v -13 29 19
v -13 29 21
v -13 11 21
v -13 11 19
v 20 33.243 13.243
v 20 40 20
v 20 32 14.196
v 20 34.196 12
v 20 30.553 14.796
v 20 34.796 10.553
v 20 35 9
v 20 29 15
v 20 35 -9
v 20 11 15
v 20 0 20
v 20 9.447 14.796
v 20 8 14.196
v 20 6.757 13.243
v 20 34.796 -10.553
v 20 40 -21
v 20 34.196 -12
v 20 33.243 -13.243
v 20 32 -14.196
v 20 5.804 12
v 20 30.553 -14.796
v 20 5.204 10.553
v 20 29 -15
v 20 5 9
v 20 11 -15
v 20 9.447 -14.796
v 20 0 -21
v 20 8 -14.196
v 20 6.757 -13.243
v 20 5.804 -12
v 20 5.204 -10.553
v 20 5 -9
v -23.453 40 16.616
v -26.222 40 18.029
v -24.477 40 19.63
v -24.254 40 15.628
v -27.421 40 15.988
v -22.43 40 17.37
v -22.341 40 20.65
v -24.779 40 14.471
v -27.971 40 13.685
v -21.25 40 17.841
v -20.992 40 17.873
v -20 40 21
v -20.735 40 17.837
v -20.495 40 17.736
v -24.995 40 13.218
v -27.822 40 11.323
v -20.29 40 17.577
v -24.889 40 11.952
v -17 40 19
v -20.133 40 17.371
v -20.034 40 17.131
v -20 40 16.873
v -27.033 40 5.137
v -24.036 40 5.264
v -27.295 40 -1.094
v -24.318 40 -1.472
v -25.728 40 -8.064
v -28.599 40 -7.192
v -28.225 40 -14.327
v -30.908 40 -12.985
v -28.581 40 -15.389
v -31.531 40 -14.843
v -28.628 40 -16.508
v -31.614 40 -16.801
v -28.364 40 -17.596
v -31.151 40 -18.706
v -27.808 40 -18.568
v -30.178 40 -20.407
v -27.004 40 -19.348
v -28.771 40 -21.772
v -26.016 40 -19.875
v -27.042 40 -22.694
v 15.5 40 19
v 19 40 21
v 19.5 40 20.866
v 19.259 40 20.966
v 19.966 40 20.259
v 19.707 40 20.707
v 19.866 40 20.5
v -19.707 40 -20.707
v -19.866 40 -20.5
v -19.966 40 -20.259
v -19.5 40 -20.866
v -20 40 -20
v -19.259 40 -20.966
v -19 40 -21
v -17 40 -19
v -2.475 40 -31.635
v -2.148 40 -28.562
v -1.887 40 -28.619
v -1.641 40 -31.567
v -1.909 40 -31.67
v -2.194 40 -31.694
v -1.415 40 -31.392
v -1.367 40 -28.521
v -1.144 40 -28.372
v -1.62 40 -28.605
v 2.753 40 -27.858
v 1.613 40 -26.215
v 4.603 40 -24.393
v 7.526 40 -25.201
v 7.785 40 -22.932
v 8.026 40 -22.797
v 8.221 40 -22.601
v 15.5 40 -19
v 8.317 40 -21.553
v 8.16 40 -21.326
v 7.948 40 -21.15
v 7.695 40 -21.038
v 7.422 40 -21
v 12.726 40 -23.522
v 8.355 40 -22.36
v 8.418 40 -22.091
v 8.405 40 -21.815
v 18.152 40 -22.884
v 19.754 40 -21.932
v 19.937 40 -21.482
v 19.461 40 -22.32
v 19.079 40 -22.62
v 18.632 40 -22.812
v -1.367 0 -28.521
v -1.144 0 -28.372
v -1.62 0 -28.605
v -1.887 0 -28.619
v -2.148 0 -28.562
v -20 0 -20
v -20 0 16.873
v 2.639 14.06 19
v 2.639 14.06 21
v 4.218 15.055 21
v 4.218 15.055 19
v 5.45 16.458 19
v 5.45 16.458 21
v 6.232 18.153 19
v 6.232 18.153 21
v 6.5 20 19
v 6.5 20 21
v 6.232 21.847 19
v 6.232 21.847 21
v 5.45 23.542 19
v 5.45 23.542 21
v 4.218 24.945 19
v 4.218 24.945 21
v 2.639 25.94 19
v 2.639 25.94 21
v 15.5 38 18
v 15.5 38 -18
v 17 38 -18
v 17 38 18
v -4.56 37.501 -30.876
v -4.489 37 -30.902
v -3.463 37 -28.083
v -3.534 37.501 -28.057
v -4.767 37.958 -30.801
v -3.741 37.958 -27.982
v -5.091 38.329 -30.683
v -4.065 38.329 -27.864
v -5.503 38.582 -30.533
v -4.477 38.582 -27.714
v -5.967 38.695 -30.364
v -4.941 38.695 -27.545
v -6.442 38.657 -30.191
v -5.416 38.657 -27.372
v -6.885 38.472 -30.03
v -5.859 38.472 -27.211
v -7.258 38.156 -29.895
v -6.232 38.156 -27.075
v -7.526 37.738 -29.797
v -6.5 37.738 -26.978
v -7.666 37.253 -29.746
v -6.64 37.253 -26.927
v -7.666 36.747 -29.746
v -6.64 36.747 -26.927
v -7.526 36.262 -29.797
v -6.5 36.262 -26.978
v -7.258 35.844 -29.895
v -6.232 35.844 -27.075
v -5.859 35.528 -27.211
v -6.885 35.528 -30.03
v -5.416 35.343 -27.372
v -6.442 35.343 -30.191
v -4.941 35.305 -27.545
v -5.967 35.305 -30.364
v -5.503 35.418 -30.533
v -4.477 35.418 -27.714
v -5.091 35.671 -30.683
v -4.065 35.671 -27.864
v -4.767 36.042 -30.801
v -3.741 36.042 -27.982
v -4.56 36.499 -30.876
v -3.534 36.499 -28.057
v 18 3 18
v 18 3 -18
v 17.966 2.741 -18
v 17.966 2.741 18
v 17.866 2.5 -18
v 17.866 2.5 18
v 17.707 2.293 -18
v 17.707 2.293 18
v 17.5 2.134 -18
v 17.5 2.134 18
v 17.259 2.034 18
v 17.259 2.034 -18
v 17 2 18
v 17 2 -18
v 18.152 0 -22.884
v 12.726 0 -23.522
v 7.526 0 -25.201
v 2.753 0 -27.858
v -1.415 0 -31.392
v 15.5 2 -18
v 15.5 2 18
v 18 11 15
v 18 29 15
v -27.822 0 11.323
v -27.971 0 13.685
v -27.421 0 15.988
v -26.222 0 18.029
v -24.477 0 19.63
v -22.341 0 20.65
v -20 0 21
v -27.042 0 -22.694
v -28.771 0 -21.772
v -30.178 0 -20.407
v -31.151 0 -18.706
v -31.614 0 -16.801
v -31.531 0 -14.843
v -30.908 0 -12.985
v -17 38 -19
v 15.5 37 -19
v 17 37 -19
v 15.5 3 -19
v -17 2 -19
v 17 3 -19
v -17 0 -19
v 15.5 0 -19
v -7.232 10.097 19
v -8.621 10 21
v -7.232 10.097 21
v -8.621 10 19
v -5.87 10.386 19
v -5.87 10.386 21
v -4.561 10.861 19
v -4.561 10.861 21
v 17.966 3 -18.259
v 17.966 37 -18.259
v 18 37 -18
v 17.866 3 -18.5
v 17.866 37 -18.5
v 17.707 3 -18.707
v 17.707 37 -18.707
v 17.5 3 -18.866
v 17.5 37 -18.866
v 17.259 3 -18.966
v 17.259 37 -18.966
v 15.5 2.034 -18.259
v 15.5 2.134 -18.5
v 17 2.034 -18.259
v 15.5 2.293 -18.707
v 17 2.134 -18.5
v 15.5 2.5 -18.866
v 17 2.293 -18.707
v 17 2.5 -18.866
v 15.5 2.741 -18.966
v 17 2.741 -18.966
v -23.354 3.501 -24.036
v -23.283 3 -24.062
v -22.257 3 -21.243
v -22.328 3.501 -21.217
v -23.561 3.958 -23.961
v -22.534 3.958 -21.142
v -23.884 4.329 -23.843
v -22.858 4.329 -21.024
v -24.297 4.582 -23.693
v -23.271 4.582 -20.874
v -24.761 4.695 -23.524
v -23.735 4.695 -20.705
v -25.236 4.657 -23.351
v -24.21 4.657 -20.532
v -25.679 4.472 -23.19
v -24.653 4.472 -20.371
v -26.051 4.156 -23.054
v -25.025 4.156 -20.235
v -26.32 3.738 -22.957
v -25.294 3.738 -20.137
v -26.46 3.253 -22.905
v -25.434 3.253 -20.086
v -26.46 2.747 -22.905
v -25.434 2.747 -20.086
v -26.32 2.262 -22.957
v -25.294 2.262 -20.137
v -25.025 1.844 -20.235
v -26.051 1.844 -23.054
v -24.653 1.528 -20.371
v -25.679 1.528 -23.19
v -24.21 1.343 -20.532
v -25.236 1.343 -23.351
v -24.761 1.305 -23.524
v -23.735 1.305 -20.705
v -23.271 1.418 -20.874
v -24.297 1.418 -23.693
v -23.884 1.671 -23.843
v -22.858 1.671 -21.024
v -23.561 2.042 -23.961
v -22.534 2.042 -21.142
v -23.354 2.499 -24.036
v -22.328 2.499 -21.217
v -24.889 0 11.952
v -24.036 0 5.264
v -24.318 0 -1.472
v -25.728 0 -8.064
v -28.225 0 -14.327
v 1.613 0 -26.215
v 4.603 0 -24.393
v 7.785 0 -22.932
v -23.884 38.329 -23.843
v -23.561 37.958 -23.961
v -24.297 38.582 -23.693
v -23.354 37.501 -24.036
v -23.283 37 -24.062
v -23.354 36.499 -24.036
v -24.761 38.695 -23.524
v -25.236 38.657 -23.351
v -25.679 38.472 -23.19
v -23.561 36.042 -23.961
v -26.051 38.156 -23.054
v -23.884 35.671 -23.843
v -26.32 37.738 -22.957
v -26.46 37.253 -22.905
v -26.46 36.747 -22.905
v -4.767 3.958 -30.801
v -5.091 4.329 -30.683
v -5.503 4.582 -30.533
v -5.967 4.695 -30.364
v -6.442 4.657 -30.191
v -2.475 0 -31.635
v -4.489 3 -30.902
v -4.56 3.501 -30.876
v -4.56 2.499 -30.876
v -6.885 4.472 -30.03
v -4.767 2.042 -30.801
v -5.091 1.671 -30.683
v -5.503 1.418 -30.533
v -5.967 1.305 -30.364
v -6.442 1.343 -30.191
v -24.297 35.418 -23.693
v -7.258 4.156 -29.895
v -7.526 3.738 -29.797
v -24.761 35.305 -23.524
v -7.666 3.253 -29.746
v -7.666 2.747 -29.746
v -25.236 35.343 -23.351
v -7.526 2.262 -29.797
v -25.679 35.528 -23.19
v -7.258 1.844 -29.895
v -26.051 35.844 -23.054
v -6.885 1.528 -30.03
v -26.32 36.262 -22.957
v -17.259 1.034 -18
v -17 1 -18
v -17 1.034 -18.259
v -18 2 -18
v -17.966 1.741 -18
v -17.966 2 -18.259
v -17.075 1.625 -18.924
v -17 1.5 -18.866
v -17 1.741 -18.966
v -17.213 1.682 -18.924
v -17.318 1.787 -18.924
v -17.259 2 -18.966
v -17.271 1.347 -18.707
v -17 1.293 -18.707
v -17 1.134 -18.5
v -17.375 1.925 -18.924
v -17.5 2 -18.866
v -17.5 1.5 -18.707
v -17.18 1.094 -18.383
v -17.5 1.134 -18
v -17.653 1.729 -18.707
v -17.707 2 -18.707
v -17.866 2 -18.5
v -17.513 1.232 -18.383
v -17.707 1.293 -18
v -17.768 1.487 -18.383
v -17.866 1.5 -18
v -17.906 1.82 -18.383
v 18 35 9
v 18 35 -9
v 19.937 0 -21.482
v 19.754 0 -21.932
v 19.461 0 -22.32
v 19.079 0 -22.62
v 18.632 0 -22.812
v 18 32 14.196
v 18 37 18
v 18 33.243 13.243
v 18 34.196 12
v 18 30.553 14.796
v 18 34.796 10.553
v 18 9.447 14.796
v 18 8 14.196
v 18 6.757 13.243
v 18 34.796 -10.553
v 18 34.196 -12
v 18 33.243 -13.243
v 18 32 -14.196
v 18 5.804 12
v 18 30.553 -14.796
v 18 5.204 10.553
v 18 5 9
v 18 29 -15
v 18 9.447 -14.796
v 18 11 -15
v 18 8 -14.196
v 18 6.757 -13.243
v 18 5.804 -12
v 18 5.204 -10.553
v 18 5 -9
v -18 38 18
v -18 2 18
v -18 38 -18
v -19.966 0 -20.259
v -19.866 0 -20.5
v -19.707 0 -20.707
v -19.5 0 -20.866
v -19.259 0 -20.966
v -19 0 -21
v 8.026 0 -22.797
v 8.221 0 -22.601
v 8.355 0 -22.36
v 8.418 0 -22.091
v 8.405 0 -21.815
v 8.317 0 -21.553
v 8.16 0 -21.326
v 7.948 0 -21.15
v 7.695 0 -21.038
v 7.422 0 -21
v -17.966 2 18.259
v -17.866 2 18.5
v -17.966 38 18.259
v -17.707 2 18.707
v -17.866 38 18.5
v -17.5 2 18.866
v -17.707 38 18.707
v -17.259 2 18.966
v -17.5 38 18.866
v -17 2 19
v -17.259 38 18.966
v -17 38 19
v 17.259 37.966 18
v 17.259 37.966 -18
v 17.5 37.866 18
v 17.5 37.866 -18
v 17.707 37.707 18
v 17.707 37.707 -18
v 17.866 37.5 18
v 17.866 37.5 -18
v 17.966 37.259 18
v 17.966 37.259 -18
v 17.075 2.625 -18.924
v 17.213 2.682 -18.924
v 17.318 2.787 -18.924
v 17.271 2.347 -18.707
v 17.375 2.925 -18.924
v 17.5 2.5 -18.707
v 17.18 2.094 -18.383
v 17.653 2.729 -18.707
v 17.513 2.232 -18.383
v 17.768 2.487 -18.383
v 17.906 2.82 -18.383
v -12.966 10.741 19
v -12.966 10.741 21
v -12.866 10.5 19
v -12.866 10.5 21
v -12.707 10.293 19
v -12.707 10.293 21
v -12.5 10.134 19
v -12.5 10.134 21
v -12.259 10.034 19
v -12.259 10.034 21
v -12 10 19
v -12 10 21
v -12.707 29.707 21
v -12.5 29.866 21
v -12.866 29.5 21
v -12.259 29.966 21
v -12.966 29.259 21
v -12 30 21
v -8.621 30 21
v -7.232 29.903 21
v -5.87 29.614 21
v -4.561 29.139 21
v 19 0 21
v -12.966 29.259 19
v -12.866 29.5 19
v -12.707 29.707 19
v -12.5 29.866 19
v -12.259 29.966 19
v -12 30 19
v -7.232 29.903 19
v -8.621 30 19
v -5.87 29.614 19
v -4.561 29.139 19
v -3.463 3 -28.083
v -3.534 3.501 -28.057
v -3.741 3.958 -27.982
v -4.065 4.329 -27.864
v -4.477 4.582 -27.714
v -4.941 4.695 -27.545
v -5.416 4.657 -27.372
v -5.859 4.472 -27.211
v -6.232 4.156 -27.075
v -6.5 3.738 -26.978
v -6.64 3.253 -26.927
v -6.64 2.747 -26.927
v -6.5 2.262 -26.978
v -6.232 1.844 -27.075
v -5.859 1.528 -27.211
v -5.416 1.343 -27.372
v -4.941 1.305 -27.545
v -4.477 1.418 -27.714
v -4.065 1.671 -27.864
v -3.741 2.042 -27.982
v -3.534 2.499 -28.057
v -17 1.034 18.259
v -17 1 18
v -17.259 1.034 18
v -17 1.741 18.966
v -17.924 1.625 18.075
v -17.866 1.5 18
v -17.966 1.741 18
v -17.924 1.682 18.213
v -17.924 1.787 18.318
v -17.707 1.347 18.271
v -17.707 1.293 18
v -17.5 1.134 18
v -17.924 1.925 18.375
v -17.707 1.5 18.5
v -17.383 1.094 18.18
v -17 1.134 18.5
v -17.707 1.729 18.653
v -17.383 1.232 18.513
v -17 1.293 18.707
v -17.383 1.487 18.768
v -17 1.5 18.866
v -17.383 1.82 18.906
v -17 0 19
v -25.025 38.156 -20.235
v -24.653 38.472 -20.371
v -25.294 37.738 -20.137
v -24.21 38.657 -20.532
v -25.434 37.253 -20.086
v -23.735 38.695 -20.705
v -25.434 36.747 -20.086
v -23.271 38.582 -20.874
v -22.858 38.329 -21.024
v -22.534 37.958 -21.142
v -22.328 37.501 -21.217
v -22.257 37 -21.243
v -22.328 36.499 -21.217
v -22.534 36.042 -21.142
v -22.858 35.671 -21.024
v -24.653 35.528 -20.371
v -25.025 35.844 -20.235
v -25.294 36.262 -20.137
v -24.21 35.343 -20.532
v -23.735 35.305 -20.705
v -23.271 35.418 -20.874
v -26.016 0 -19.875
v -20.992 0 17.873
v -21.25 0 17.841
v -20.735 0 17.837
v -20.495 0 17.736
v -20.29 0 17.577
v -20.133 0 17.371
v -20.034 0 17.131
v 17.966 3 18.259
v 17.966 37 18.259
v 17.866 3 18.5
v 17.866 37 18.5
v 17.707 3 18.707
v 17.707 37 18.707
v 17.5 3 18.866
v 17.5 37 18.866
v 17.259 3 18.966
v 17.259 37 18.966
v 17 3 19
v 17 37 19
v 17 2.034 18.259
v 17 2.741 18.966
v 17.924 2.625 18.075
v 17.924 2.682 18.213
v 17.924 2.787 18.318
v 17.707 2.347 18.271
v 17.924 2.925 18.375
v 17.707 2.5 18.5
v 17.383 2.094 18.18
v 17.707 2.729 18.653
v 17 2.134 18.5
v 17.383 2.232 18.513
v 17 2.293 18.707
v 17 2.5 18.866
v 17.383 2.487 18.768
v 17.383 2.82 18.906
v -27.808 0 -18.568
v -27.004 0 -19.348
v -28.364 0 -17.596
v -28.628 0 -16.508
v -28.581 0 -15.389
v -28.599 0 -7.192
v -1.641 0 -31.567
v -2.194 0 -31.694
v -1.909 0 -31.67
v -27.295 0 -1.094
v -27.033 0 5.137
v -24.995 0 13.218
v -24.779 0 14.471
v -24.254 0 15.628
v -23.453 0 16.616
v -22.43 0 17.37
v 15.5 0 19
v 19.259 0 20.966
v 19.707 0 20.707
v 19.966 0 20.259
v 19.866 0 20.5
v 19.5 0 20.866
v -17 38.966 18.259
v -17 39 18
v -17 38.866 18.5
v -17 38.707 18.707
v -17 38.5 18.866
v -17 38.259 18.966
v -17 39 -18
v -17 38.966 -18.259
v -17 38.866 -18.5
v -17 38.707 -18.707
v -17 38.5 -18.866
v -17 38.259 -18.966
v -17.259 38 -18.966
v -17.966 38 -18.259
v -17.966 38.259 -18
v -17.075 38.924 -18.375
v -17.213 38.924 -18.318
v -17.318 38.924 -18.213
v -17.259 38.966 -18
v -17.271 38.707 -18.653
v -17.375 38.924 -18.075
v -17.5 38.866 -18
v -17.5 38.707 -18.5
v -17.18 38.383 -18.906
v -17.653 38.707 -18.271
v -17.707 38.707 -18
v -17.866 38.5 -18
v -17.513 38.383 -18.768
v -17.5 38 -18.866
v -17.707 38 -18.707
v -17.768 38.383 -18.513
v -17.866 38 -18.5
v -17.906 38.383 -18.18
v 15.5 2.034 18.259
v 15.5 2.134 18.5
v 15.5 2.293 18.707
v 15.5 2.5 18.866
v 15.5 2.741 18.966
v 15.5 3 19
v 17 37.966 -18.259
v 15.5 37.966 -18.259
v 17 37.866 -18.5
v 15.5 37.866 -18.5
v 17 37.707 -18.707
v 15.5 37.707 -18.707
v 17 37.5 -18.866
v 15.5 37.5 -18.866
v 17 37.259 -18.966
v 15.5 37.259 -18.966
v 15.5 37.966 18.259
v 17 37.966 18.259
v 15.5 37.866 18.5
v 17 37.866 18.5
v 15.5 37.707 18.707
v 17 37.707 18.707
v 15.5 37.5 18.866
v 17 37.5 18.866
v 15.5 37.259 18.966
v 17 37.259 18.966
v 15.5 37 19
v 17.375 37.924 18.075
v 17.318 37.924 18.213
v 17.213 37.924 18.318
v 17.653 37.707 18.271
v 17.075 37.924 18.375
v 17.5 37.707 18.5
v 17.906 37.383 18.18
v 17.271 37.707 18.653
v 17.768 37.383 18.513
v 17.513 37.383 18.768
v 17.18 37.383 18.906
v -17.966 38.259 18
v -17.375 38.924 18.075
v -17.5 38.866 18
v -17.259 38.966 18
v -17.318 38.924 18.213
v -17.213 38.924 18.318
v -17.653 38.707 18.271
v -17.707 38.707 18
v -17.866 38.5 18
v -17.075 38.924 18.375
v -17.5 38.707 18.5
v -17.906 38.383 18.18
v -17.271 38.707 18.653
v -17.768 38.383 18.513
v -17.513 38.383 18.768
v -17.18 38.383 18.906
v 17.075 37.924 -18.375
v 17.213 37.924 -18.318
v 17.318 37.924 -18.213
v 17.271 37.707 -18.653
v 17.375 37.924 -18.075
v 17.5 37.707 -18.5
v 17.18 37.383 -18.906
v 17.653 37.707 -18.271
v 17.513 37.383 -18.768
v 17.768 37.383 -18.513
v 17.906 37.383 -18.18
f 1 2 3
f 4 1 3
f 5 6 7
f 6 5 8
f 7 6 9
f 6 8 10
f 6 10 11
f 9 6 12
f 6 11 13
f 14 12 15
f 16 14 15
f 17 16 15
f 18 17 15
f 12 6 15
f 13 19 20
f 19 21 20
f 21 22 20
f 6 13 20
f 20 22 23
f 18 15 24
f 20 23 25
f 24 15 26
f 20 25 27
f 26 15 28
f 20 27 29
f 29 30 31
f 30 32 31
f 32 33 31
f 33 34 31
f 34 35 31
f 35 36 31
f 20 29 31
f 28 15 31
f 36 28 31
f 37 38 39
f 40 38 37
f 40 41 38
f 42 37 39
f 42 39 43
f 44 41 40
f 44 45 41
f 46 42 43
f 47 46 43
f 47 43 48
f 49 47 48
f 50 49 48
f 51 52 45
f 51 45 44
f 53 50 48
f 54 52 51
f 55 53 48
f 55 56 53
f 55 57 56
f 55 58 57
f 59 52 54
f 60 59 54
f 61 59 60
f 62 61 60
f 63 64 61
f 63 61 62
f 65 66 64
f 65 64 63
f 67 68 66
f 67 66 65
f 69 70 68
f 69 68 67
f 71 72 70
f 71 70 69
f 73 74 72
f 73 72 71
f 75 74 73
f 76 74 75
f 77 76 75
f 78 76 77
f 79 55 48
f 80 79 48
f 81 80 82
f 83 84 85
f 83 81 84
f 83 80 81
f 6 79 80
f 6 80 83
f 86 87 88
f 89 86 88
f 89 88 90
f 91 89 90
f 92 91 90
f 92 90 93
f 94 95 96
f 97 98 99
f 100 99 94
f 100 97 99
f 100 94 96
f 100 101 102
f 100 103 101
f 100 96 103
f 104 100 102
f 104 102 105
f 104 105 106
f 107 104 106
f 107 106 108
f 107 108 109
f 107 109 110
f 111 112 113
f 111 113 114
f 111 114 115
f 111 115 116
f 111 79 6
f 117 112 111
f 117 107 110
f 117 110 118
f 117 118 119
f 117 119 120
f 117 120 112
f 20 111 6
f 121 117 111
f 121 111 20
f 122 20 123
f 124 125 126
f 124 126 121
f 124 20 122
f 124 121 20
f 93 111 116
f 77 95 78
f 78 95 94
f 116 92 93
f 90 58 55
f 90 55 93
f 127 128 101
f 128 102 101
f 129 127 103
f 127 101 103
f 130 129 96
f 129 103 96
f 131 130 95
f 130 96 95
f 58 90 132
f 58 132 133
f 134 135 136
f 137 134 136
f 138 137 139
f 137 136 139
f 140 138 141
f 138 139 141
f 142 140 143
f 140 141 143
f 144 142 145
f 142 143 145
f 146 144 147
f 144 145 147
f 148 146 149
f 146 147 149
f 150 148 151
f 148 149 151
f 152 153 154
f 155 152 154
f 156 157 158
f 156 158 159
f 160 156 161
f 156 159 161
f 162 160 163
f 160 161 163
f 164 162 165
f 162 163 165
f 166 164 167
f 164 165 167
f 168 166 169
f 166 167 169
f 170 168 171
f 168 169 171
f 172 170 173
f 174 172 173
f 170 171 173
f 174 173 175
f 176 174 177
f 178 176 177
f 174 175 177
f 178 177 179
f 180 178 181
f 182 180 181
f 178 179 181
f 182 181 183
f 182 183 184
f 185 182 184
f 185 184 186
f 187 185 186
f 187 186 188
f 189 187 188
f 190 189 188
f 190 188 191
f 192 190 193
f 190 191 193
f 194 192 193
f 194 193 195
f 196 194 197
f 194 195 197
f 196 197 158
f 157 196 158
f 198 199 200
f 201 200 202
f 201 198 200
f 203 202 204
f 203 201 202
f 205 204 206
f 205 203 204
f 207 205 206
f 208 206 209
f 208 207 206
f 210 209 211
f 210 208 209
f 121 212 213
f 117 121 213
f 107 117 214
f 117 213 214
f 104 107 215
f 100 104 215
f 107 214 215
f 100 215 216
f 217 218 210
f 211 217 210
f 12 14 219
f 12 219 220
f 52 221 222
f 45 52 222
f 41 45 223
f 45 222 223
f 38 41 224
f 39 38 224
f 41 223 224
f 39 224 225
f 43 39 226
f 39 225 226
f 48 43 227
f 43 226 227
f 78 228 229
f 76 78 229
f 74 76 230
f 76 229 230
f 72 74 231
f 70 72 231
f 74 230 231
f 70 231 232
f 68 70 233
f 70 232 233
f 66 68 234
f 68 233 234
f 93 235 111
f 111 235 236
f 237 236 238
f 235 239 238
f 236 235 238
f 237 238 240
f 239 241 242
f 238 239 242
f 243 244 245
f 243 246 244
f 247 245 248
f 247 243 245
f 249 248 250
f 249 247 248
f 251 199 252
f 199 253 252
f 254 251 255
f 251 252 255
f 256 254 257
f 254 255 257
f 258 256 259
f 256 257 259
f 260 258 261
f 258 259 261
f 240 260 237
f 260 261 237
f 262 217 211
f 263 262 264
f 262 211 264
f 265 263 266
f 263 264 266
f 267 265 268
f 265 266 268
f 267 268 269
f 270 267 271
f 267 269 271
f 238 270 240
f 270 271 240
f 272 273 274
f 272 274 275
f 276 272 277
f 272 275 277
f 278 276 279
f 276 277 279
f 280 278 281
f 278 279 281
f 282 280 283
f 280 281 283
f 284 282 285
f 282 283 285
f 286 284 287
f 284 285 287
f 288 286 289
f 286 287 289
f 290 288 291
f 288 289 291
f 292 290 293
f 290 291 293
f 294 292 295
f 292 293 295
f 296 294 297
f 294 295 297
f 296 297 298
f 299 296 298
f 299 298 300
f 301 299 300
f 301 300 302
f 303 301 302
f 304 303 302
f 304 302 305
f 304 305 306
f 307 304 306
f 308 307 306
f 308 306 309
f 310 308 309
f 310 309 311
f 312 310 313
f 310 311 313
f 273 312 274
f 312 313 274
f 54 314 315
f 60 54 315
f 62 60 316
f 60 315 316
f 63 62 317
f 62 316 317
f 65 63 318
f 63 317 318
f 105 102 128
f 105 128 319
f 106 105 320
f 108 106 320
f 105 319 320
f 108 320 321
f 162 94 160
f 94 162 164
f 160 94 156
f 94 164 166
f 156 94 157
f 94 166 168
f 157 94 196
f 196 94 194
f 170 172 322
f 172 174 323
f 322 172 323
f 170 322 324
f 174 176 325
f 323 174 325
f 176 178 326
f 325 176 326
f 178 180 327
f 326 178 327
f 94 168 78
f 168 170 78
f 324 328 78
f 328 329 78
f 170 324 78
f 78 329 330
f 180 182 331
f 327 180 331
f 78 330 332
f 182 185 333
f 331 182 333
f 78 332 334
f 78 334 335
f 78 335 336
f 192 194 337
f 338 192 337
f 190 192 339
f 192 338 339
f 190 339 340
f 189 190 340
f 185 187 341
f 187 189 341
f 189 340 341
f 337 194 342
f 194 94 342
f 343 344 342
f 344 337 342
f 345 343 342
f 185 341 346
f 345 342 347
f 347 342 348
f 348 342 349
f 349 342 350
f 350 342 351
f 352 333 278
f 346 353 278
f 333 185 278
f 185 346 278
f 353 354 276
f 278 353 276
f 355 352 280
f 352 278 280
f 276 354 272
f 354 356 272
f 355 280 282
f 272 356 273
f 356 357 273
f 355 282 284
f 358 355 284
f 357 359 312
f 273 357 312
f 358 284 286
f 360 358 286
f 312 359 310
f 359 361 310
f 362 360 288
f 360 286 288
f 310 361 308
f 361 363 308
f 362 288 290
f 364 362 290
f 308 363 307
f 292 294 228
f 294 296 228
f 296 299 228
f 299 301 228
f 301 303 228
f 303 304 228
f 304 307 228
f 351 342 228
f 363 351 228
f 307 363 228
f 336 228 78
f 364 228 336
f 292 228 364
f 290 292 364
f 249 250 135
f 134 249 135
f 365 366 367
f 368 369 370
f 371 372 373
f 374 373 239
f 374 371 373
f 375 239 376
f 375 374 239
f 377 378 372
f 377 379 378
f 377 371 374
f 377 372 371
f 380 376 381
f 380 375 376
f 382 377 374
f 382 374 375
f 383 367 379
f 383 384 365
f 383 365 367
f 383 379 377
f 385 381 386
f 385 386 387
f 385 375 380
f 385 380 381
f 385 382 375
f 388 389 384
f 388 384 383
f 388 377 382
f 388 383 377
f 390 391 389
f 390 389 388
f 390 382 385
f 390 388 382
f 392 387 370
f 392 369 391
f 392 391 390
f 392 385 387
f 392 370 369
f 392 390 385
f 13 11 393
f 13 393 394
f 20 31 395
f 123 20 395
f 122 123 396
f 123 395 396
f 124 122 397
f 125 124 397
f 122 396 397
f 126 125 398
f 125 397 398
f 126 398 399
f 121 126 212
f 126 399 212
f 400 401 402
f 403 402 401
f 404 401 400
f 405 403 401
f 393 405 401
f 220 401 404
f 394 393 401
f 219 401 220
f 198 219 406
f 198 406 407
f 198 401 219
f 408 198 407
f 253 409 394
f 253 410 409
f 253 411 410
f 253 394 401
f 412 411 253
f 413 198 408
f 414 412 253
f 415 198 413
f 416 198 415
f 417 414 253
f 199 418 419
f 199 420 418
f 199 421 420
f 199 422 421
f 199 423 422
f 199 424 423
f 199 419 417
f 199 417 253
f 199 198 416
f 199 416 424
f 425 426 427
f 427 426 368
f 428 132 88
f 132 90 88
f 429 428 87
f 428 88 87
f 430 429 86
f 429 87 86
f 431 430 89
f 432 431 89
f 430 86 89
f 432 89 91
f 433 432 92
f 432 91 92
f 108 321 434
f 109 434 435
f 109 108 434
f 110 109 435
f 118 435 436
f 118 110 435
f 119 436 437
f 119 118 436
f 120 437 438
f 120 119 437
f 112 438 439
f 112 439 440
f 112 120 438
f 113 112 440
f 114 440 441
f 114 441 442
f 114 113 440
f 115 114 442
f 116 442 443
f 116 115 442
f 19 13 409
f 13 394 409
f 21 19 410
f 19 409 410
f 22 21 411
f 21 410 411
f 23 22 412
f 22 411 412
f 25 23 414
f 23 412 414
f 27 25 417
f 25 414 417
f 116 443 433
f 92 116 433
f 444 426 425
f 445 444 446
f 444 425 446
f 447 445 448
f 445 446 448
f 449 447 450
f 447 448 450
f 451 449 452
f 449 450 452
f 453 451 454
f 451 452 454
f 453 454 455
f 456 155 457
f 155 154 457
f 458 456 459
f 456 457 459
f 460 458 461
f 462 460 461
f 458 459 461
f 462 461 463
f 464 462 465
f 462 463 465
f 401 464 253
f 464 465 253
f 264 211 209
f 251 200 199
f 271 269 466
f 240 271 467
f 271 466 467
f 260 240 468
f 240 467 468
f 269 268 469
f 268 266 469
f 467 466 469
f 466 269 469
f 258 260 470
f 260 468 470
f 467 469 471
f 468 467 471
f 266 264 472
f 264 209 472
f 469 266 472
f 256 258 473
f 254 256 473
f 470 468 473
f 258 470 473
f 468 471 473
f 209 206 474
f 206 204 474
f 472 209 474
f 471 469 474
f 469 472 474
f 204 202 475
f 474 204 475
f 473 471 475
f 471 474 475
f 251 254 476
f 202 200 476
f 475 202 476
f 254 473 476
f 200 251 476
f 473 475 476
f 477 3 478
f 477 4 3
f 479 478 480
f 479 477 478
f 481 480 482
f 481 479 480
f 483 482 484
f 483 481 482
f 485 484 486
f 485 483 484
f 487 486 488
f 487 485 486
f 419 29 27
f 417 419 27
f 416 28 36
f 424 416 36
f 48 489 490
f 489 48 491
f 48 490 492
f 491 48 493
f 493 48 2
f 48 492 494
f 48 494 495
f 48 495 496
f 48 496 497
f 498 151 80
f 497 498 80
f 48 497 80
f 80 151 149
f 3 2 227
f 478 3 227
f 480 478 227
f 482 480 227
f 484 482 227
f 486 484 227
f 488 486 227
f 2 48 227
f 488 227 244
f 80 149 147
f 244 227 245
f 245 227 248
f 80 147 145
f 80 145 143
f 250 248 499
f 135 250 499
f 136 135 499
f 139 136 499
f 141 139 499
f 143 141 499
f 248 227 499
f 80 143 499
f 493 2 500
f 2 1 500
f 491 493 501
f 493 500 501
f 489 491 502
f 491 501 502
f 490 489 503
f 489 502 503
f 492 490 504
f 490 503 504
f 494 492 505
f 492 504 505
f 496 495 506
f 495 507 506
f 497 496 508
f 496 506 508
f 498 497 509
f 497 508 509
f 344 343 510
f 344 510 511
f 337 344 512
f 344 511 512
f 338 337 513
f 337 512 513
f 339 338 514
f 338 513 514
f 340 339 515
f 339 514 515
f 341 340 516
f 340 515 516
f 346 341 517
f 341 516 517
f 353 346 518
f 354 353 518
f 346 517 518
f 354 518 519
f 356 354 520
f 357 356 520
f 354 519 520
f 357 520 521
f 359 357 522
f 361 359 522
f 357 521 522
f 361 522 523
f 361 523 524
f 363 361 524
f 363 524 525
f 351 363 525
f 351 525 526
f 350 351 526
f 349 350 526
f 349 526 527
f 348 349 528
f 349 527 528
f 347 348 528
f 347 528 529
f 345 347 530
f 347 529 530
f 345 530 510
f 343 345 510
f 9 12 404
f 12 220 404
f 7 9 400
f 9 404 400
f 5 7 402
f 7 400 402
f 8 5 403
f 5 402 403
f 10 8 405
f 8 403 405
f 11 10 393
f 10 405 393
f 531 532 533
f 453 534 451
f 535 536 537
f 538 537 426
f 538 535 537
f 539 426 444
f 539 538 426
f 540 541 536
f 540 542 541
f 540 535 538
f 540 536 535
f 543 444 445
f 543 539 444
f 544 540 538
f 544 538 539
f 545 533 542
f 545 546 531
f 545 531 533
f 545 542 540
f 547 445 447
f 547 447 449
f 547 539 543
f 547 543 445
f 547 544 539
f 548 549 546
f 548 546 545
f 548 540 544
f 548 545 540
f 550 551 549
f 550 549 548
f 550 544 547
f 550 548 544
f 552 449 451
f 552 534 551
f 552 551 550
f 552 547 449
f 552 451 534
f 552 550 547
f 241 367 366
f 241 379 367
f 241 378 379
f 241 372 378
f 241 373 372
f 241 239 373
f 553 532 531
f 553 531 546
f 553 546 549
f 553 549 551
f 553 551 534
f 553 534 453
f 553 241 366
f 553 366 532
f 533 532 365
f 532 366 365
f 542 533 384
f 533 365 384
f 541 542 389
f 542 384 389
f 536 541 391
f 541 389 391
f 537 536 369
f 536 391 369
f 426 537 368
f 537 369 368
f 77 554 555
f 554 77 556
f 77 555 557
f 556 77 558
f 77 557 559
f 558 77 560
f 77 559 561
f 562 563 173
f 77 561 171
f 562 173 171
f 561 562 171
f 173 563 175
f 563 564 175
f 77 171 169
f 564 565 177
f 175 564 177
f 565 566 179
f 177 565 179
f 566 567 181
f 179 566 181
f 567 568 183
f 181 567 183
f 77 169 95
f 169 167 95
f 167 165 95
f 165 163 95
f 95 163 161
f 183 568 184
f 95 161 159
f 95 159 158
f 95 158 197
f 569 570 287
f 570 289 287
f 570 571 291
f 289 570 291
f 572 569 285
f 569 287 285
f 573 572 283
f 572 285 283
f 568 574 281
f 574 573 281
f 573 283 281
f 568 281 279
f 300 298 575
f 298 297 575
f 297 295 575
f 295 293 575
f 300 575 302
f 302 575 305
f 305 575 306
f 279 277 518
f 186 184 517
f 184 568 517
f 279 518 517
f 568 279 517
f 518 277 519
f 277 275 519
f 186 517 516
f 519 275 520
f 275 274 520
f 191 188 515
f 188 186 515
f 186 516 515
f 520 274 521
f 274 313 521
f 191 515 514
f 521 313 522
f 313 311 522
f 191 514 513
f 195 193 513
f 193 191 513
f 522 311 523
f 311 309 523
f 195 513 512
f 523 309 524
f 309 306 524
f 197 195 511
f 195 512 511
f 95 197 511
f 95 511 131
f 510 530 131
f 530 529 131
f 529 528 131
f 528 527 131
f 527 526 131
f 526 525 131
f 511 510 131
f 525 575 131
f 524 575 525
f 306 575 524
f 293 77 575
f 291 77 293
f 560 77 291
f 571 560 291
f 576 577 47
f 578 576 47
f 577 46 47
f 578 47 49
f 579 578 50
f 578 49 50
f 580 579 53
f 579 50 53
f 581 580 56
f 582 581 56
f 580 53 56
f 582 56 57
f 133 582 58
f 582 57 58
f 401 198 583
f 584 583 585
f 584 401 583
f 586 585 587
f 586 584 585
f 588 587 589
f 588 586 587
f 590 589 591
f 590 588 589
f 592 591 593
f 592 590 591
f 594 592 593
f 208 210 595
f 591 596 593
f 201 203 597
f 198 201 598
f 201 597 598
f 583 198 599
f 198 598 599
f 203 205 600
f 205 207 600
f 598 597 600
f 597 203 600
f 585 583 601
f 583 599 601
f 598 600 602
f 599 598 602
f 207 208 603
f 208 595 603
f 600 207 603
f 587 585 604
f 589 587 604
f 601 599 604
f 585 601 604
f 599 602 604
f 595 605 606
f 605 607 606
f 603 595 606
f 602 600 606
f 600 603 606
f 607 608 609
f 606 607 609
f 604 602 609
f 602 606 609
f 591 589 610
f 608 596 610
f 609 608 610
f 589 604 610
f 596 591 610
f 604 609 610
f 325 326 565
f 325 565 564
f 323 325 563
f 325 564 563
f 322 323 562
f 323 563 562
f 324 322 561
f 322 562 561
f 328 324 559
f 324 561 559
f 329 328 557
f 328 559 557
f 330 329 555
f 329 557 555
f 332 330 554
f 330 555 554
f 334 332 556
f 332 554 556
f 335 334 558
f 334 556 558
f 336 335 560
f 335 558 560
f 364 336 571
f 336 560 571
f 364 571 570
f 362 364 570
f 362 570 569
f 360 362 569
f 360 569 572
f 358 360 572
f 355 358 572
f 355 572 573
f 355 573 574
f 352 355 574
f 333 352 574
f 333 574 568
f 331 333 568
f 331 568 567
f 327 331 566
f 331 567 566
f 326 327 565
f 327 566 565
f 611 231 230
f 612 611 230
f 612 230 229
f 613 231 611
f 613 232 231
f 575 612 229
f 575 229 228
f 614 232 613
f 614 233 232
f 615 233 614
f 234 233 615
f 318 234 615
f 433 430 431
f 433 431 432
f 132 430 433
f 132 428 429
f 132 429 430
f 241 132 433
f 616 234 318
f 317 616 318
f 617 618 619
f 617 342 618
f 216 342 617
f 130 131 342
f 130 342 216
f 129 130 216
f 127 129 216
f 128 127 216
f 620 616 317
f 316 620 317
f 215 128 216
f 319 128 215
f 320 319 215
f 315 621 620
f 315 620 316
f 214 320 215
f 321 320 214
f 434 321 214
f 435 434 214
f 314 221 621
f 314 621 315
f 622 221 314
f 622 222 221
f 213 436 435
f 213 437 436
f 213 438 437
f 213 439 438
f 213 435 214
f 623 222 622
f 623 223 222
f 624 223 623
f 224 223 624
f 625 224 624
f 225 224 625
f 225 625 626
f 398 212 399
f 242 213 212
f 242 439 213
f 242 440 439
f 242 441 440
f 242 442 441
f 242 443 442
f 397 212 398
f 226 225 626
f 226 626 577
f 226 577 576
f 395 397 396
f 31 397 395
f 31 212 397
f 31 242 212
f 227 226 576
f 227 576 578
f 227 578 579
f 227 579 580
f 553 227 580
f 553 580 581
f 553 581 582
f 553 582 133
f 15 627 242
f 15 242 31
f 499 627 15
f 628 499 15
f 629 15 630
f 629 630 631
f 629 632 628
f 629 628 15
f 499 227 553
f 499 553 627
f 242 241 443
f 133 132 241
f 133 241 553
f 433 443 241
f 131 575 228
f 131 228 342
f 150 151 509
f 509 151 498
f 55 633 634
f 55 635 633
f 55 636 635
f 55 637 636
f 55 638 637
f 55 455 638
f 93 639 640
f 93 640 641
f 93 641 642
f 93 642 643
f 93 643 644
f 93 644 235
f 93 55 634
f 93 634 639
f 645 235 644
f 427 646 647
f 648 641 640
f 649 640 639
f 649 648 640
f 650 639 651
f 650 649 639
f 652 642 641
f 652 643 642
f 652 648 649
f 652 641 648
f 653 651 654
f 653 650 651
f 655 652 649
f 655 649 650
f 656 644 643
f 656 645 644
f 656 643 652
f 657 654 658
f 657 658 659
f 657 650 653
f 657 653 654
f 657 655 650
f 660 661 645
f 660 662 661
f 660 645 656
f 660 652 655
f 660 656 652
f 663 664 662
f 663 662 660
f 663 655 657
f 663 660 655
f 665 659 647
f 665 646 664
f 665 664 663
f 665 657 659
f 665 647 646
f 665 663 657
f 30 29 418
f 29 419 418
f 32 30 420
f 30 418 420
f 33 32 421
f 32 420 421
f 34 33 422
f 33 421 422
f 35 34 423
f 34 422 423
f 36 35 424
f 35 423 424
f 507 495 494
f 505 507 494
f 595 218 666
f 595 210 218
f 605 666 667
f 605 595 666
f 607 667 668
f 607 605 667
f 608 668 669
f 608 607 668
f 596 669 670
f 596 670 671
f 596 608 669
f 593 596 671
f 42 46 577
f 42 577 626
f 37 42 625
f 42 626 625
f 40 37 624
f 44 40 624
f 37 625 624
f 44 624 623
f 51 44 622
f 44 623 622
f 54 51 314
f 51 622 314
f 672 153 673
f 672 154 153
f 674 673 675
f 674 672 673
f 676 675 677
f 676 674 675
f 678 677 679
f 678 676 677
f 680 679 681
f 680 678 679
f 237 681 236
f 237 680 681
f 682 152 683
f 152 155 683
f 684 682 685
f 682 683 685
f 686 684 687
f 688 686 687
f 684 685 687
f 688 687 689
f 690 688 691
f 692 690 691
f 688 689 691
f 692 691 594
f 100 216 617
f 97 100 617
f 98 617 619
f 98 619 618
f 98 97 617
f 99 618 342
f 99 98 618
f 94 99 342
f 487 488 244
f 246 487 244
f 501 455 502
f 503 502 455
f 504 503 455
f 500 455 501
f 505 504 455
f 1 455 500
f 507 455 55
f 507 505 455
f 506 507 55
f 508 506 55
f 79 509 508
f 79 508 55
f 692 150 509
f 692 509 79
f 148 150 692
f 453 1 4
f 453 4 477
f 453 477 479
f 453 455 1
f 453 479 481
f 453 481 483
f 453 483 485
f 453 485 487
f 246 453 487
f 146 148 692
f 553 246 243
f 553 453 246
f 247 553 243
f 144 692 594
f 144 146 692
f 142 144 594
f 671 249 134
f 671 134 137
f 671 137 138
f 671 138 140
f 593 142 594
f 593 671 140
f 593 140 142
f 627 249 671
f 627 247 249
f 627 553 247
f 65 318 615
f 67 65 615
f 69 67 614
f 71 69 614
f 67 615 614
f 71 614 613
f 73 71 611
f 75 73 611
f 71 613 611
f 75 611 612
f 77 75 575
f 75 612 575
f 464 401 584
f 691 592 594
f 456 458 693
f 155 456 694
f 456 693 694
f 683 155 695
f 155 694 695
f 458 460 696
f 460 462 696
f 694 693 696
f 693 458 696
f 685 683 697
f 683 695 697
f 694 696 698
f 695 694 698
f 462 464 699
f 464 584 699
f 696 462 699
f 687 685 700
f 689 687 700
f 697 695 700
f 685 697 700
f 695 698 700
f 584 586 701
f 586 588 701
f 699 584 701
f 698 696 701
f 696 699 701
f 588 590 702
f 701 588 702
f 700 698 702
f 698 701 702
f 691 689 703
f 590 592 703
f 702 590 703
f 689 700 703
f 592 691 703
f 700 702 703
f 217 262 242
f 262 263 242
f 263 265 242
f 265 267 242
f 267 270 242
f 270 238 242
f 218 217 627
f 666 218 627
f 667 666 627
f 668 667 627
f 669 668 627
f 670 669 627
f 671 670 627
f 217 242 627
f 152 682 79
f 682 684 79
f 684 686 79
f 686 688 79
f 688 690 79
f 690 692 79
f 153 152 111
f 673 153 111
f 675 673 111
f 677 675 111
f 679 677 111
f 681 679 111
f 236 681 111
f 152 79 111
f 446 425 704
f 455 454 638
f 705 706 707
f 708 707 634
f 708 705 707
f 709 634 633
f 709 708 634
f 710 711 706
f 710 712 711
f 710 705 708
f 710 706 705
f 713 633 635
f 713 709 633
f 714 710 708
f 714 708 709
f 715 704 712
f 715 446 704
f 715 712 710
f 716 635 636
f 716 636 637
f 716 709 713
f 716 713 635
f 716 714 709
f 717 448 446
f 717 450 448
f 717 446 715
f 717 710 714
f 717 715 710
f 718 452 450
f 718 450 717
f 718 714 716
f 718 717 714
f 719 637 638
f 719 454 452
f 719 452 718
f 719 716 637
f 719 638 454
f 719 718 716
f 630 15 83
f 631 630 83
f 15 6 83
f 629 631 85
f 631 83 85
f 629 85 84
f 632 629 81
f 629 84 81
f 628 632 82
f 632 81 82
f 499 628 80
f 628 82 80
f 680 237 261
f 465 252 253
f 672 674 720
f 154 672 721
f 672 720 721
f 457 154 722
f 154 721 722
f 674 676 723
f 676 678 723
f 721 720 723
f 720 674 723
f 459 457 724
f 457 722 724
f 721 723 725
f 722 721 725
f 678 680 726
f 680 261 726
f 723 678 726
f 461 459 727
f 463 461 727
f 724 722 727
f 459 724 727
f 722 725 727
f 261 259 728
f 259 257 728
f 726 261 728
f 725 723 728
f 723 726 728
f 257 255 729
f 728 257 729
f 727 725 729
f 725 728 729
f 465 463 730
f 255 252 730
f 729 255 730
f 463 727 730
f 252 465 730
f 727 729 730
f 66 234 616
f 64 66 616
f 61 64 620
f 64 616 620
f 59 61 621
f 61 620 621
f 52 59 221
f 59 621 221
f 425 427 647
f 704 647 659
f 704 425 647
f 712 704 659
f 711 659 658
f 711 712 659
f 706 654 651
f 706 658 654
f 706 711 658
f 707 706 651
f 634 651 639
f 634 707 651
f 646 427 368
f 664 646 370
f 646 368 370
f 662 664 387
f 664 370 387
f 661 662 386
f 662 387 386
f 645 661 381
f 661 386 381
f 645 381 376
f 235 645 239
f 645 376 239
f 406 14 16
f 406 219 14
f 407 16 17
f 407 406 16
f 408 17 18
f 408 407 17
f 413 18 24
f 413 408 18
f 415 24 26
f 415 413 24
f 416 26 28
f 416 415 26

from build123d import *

# Parameters (mm, degrees)
SKIZZE1_W                       = 36
SKIZZE1_H                       = 38
AUFSATZ_LINEAR_AUSTRAGEN2_DEPTH = 40
VERRUNDUNG1_R                   = 1
SCHNITT_LINEAR_AUSTRAGEN1_REACH = 74.681
SKIZZE2_W                       = 30
SKIZZE2_H                       = 30
VERRUNDUNG2_R                   = 6
DURCHGANGSLOCH_F_R_M31_D        = 3.4
DURCHGANGSLOCH_F_R_M31_DEPTH    = 3
DURCHGANGSLOCH_F_R_M31_TIP      = 1.021463052
SKIZZE5_W                       = 2.5
SKIZZE5_H                       = 38
SKIZZE5_W_2                     = 1
AUFSATZ_LINEAR_AUSTRAGEN3_DEPTH = 2
SKIZZE8_W                       = 1
SKIZZE8_H                       = 38
SCHNITT_LINEAR_AUSTRAGEN3_DEPTH = 1
SKIZZE6_W                       = 2.5
SKIZZE6_H                       = 38
SKIZZE6_W_2                     = 1
AUFSATZ_LINEAR_AUSTRAGEN4_DEPTH = 2
SKIZZE9_W                       = 1
SKIZZE9_H                       = 38
SCHNITT_LINEAR_AUSTRAGEN4_DEPTH = 1
VERRUNDUNG3_R                   = 1
VERRUNDUNG4_R                   = 1
SCHNITT_LINEAR_AUSTRAGEN2_REACH = 75.338
VERRUNDUNG9_R                   = 1
VERRUNDUNG10_R                  = 10


with BuildPart() as part:
    # Skizze1 → Aufsatz-Linear austragen2 (new body)
    with BuildSketch(Plane(origin=(0, 0, 0), x_dir=(1, 0, 0), z_dir=(0, 1, 0))):
        with BuildLine():
            Line((20, -21), (20, 21))
            ThreePointArc((20, 21), (19.460793496, 22.319706051), (18.151722222, 22.884241359))
            ThreePointArc((18.151722222, 22.884241359), (7.231561818, 25.331524584), (-1.857986079, 31.859864147))
            Line((-1.857986079, 31.859864147), (-27.041617117, 22.693772058))
            ThreePointArc((-27.041617117, 22.693772058), (-31.15076398, 18.70575902), (-30.908104914, 12.984705575))
            ThreePointArc((-30.908104914, 12.984705575), (-27.294602816, 1.09378988), (-27.822222222, -11.322847799))
            ThreePointArc((-27.822222222, -11.322847799), (-26.22162429, -18.029054702), (-20, -21))
            Line((-20, -21), (20, -21))
        make_face()
        Rectangle(SKIZZE1_W, SKIZZE1_H, mode=Mode.SUBTRACT)
        with BuildLine():
            Line((16, 21), (-20, 21))
            Line((-20, 21), (-20, -18))
            ThreePointArc((-20, -18), (-23.888515181, -16.143159189), (-24.888888889, -11.951779874))
            ThreePointArc((-24.888888889, -11.951779874), (-24.318489531, 1.471612211), (-28.224978285, 14.326656205))
            ThreePointArc((-28.224978285, 14.326656205), (-28.363640609, 17.595829603), (-26.015556687, 19.874694196))
            Line((-26.015556687, 19.874694196), (-1.583548546, 28.767217922))
            ThreePointArc((-1.583548546, 28.767217922), (6.56927519, 23.437142814), (16, 21))
        make_face(mode=Mode.SUBTRACT)
    extrude(amount=AUFSATZ_LINEAR_AUSTRAGEN2_DEPTH)

    # Verrundung1
    verrundung1_edges = [part.edges().sort_by_distance(p)[0] for p in [
        (20, 20, 21),
        (16, 20, -21),
        (-1.583548546, 20, -28.767217922),
        (-20, 20, 18),
        (-20, 20, -21),
    ]]
    fillet(verrundung1_edges, radius=VERRUNDUNG1_R)

    # Skizze2 → Schnitt-Linear austragen1 (cut, up to next)
    with BuildSketch(Plane(origin=(20, 0, 0), x_dir=(0, 0, -1), z_dir=(1, 0, 0)), mode=Mode.PRIVATE) as schnitt_linear_austragen1_sk1:
        with Locations((0, 20)):
            Rectangle(SKIZZE2_W, SKIZZE2_H)
    schnitt_linear_austragen1_tool1 = extrude(schnitt_linear_austragen1_sk1.sketch, amount=-SCHNITT_LINEAR_AUSTRAGEN1_REACH, mode=Mode.PRIVATE) & part.part
    add(schnitt_linear_austragen1_tool1.solids().sort_by_distance((20, 20, 0))[0], mode=Mode.SUBTRACT)

    # Verrundung2
    verrundung2_edges = [part.edges().sort_by_distance(p)[0] for p in [
        (19, 5, 15),
        (19, 35, 15),
        (19, 35, -15),
        (19, 5, -15),
    ]]
    fillet(verrundung2_edges, radius=VERRUNDUNG2_R)

    # Durchgangsloch für M31
    with Locations(Plane(origin=(-10.456906044, 0, -28.730113233), x_dir=(-0.9396926207859081, 0, 0.34202014332566955), z_dir=(-0.34202014332566955, 0, -0.9396926207859082))):
        with Locations((-4.650779494, 37), (15.349220506, 3), (-4.650779494, 3), (15.349220506, 37)):
            Hole(DURCHGANGSLOCH_F_R_M31_D / 2, depth=DURCHGANGSLOCH_F_R_M31_DEPTH)
            with Locations((0, 0, -(DURCHGANGSLOCH_F_R_M31_DEPTH + DURCHGANGSLOCH_F_R_M31_TIP / 2))):  # 118° drill point
                Cone(0, DURCHGANGSLOCH_F_R_M31_D / 2, DURCHGANGSLOCH_F_R_M31_TIP, mode=Mode.SUBTRACT)

    # Skizze5 → Aufsatz-Linear austragen3 (add)
    with BuildSketch(Plane.XZ):
        with Locations((16.75, 0)):
            Rectangle(SKIZZE5_W, SKIZZE5_H)
        with Locations((-17.5, 0)):
            Rectangle(SKIZZE5_W_2, SKIZZE5_H)
    extrude(amount=-AUFSATZ_LINEAR_AUSTRAGEN3_DEPTH)

    # Skizze8 → Schnitt-Linear austragen3 (cut)
    with BuildSketch(Plane(origin=(0, 2, 0), x_dir=(1, 0, 0), z_dir=(0, 1, 0))):
        with Locations((-17.5, 0)):
            Rectangle(SKIZZE8_W, SKIZZE8_H)
    extrude(amount=-SCHNITT_LINEAR_AUSTRAGEN3_DEPTH, mode=Mode.SUBTRACT)

    # Skizze6 → Aufsatz-Linear austragen4 (add)
    with BuildSketch(Plane(origin=(0, 40, 0), x_dir=(1, 0, 0), z_dir=(0, 1, 0))):
        with Locations((16.75, 0)):
            Rectangle(SKIZZE6_W, SKIZZE6_H)
        with Locations((-17.5, 0)):
            Rectangle(SKIZZE6_W_2, SKIZZE6_H)
    extrude(amount=-AUFSATZ_LINEAR_AUSTRAGEN4_DEPTH)

    # Skizze9 → Schnitt-Linear austragen4 (cut)
    with BuildSketch(Plane.XZ.offset(-38)):
        with Locations((-17.5, 0)):
            Rectangle(SKIZZE9_W, SKIZZE9_H)
    extrude(amount=-SCHNITT_LINEAR_AUSTRAGEN4_DEPTH, mode=Mode.SUBTRACT)

    # Verrundung3
    verrundung3_edges = [part.edges().sort_by_distance(p)[0] for p in [
        (16.75, 2, 19),
        (18, 2, 0),
        (16.75, 2, -19),
        (-17.5, 1, 19),
        (-18, 1, 0),
        (-17.5, 1, -19),
        (18, 20, -19),
        (18, 20, 19),
        (16.75, 38, -19),
        (18, 38, 0),
        (16.75, 38, 19),
        (-18, 20, -19),
        (-18, 20, 19),
        (-17.5, 39, -19),
        (-18, 39, 0),
        (-17.5, 39, 19),
    ]]
    fillet(verrundung3_edges, radius=VERRUNDUNG3_R - 0.0001)  # a hair under: the kernel refuses the full size

    # Verrundung4
    verrundung4_edges = [part.edges().sort_by_distance(p)[0] for p in [
        (-1.857986079, 20, -31.859864147),
    ]]
    fillet(verrundung4_edges, radius=VERRUNDUNG4_R)

    # Skizze7 → Schnitt-Linear austragen2 (cut, up to next)
    with BuildSketch(Plane.XY.offset(21), mode=Mode.PRIVATE) as schnitt_linear_austragen2_sk1:
        with BuildLine():
            Line((-13, 10), (-6.5, 10))
            Line((-6.5, 10), (2.63884007, 14.059753954))
            ThreePointArc((2.63884007, 14.059753954), (6.5, 20), (2.63884007, 25.940246046))
            Line((2.63884007, 25.940246046), (-6.5, 30))
            Line((-6.5, 30), (-13, 30))
            Line((-13, 30), (-13, 10))
        make_face()
    schnitt_linear_austragen2_tool1 = extrude(schnitt_linear_austragen2_sk1.sketch, amount=-SCHNITT_LINEAR_AUSTRAGEN2_REACH, mode=Mode.PRIVATE) & part.part
    add(schnitt_linear_austragen2_tool1.solids().sort_by_distance((-4.747297, 20, 21))[0], mode=Mode.SUBTRACT)

    # Verrundung9
    verrundung9_edges = [part.edges().sort_by_distance(p)[0] for p in [
        (-13, 10, 20),
        (-13, 30, 20),
    ]]
    fillet(verrundung9_edges, radius=VERRUNDUNG9_R)

    # Verrundung10
    verrundung10_edges = [part.edges().sort_by_distance(p)[0] for p in [
        (-6.5, 30, 20),
        (-6.5, 10, 20),
    ]]
    fillet(verrundung10_edges, radius=VERRUNDUNG10_R)


solid = part.part
